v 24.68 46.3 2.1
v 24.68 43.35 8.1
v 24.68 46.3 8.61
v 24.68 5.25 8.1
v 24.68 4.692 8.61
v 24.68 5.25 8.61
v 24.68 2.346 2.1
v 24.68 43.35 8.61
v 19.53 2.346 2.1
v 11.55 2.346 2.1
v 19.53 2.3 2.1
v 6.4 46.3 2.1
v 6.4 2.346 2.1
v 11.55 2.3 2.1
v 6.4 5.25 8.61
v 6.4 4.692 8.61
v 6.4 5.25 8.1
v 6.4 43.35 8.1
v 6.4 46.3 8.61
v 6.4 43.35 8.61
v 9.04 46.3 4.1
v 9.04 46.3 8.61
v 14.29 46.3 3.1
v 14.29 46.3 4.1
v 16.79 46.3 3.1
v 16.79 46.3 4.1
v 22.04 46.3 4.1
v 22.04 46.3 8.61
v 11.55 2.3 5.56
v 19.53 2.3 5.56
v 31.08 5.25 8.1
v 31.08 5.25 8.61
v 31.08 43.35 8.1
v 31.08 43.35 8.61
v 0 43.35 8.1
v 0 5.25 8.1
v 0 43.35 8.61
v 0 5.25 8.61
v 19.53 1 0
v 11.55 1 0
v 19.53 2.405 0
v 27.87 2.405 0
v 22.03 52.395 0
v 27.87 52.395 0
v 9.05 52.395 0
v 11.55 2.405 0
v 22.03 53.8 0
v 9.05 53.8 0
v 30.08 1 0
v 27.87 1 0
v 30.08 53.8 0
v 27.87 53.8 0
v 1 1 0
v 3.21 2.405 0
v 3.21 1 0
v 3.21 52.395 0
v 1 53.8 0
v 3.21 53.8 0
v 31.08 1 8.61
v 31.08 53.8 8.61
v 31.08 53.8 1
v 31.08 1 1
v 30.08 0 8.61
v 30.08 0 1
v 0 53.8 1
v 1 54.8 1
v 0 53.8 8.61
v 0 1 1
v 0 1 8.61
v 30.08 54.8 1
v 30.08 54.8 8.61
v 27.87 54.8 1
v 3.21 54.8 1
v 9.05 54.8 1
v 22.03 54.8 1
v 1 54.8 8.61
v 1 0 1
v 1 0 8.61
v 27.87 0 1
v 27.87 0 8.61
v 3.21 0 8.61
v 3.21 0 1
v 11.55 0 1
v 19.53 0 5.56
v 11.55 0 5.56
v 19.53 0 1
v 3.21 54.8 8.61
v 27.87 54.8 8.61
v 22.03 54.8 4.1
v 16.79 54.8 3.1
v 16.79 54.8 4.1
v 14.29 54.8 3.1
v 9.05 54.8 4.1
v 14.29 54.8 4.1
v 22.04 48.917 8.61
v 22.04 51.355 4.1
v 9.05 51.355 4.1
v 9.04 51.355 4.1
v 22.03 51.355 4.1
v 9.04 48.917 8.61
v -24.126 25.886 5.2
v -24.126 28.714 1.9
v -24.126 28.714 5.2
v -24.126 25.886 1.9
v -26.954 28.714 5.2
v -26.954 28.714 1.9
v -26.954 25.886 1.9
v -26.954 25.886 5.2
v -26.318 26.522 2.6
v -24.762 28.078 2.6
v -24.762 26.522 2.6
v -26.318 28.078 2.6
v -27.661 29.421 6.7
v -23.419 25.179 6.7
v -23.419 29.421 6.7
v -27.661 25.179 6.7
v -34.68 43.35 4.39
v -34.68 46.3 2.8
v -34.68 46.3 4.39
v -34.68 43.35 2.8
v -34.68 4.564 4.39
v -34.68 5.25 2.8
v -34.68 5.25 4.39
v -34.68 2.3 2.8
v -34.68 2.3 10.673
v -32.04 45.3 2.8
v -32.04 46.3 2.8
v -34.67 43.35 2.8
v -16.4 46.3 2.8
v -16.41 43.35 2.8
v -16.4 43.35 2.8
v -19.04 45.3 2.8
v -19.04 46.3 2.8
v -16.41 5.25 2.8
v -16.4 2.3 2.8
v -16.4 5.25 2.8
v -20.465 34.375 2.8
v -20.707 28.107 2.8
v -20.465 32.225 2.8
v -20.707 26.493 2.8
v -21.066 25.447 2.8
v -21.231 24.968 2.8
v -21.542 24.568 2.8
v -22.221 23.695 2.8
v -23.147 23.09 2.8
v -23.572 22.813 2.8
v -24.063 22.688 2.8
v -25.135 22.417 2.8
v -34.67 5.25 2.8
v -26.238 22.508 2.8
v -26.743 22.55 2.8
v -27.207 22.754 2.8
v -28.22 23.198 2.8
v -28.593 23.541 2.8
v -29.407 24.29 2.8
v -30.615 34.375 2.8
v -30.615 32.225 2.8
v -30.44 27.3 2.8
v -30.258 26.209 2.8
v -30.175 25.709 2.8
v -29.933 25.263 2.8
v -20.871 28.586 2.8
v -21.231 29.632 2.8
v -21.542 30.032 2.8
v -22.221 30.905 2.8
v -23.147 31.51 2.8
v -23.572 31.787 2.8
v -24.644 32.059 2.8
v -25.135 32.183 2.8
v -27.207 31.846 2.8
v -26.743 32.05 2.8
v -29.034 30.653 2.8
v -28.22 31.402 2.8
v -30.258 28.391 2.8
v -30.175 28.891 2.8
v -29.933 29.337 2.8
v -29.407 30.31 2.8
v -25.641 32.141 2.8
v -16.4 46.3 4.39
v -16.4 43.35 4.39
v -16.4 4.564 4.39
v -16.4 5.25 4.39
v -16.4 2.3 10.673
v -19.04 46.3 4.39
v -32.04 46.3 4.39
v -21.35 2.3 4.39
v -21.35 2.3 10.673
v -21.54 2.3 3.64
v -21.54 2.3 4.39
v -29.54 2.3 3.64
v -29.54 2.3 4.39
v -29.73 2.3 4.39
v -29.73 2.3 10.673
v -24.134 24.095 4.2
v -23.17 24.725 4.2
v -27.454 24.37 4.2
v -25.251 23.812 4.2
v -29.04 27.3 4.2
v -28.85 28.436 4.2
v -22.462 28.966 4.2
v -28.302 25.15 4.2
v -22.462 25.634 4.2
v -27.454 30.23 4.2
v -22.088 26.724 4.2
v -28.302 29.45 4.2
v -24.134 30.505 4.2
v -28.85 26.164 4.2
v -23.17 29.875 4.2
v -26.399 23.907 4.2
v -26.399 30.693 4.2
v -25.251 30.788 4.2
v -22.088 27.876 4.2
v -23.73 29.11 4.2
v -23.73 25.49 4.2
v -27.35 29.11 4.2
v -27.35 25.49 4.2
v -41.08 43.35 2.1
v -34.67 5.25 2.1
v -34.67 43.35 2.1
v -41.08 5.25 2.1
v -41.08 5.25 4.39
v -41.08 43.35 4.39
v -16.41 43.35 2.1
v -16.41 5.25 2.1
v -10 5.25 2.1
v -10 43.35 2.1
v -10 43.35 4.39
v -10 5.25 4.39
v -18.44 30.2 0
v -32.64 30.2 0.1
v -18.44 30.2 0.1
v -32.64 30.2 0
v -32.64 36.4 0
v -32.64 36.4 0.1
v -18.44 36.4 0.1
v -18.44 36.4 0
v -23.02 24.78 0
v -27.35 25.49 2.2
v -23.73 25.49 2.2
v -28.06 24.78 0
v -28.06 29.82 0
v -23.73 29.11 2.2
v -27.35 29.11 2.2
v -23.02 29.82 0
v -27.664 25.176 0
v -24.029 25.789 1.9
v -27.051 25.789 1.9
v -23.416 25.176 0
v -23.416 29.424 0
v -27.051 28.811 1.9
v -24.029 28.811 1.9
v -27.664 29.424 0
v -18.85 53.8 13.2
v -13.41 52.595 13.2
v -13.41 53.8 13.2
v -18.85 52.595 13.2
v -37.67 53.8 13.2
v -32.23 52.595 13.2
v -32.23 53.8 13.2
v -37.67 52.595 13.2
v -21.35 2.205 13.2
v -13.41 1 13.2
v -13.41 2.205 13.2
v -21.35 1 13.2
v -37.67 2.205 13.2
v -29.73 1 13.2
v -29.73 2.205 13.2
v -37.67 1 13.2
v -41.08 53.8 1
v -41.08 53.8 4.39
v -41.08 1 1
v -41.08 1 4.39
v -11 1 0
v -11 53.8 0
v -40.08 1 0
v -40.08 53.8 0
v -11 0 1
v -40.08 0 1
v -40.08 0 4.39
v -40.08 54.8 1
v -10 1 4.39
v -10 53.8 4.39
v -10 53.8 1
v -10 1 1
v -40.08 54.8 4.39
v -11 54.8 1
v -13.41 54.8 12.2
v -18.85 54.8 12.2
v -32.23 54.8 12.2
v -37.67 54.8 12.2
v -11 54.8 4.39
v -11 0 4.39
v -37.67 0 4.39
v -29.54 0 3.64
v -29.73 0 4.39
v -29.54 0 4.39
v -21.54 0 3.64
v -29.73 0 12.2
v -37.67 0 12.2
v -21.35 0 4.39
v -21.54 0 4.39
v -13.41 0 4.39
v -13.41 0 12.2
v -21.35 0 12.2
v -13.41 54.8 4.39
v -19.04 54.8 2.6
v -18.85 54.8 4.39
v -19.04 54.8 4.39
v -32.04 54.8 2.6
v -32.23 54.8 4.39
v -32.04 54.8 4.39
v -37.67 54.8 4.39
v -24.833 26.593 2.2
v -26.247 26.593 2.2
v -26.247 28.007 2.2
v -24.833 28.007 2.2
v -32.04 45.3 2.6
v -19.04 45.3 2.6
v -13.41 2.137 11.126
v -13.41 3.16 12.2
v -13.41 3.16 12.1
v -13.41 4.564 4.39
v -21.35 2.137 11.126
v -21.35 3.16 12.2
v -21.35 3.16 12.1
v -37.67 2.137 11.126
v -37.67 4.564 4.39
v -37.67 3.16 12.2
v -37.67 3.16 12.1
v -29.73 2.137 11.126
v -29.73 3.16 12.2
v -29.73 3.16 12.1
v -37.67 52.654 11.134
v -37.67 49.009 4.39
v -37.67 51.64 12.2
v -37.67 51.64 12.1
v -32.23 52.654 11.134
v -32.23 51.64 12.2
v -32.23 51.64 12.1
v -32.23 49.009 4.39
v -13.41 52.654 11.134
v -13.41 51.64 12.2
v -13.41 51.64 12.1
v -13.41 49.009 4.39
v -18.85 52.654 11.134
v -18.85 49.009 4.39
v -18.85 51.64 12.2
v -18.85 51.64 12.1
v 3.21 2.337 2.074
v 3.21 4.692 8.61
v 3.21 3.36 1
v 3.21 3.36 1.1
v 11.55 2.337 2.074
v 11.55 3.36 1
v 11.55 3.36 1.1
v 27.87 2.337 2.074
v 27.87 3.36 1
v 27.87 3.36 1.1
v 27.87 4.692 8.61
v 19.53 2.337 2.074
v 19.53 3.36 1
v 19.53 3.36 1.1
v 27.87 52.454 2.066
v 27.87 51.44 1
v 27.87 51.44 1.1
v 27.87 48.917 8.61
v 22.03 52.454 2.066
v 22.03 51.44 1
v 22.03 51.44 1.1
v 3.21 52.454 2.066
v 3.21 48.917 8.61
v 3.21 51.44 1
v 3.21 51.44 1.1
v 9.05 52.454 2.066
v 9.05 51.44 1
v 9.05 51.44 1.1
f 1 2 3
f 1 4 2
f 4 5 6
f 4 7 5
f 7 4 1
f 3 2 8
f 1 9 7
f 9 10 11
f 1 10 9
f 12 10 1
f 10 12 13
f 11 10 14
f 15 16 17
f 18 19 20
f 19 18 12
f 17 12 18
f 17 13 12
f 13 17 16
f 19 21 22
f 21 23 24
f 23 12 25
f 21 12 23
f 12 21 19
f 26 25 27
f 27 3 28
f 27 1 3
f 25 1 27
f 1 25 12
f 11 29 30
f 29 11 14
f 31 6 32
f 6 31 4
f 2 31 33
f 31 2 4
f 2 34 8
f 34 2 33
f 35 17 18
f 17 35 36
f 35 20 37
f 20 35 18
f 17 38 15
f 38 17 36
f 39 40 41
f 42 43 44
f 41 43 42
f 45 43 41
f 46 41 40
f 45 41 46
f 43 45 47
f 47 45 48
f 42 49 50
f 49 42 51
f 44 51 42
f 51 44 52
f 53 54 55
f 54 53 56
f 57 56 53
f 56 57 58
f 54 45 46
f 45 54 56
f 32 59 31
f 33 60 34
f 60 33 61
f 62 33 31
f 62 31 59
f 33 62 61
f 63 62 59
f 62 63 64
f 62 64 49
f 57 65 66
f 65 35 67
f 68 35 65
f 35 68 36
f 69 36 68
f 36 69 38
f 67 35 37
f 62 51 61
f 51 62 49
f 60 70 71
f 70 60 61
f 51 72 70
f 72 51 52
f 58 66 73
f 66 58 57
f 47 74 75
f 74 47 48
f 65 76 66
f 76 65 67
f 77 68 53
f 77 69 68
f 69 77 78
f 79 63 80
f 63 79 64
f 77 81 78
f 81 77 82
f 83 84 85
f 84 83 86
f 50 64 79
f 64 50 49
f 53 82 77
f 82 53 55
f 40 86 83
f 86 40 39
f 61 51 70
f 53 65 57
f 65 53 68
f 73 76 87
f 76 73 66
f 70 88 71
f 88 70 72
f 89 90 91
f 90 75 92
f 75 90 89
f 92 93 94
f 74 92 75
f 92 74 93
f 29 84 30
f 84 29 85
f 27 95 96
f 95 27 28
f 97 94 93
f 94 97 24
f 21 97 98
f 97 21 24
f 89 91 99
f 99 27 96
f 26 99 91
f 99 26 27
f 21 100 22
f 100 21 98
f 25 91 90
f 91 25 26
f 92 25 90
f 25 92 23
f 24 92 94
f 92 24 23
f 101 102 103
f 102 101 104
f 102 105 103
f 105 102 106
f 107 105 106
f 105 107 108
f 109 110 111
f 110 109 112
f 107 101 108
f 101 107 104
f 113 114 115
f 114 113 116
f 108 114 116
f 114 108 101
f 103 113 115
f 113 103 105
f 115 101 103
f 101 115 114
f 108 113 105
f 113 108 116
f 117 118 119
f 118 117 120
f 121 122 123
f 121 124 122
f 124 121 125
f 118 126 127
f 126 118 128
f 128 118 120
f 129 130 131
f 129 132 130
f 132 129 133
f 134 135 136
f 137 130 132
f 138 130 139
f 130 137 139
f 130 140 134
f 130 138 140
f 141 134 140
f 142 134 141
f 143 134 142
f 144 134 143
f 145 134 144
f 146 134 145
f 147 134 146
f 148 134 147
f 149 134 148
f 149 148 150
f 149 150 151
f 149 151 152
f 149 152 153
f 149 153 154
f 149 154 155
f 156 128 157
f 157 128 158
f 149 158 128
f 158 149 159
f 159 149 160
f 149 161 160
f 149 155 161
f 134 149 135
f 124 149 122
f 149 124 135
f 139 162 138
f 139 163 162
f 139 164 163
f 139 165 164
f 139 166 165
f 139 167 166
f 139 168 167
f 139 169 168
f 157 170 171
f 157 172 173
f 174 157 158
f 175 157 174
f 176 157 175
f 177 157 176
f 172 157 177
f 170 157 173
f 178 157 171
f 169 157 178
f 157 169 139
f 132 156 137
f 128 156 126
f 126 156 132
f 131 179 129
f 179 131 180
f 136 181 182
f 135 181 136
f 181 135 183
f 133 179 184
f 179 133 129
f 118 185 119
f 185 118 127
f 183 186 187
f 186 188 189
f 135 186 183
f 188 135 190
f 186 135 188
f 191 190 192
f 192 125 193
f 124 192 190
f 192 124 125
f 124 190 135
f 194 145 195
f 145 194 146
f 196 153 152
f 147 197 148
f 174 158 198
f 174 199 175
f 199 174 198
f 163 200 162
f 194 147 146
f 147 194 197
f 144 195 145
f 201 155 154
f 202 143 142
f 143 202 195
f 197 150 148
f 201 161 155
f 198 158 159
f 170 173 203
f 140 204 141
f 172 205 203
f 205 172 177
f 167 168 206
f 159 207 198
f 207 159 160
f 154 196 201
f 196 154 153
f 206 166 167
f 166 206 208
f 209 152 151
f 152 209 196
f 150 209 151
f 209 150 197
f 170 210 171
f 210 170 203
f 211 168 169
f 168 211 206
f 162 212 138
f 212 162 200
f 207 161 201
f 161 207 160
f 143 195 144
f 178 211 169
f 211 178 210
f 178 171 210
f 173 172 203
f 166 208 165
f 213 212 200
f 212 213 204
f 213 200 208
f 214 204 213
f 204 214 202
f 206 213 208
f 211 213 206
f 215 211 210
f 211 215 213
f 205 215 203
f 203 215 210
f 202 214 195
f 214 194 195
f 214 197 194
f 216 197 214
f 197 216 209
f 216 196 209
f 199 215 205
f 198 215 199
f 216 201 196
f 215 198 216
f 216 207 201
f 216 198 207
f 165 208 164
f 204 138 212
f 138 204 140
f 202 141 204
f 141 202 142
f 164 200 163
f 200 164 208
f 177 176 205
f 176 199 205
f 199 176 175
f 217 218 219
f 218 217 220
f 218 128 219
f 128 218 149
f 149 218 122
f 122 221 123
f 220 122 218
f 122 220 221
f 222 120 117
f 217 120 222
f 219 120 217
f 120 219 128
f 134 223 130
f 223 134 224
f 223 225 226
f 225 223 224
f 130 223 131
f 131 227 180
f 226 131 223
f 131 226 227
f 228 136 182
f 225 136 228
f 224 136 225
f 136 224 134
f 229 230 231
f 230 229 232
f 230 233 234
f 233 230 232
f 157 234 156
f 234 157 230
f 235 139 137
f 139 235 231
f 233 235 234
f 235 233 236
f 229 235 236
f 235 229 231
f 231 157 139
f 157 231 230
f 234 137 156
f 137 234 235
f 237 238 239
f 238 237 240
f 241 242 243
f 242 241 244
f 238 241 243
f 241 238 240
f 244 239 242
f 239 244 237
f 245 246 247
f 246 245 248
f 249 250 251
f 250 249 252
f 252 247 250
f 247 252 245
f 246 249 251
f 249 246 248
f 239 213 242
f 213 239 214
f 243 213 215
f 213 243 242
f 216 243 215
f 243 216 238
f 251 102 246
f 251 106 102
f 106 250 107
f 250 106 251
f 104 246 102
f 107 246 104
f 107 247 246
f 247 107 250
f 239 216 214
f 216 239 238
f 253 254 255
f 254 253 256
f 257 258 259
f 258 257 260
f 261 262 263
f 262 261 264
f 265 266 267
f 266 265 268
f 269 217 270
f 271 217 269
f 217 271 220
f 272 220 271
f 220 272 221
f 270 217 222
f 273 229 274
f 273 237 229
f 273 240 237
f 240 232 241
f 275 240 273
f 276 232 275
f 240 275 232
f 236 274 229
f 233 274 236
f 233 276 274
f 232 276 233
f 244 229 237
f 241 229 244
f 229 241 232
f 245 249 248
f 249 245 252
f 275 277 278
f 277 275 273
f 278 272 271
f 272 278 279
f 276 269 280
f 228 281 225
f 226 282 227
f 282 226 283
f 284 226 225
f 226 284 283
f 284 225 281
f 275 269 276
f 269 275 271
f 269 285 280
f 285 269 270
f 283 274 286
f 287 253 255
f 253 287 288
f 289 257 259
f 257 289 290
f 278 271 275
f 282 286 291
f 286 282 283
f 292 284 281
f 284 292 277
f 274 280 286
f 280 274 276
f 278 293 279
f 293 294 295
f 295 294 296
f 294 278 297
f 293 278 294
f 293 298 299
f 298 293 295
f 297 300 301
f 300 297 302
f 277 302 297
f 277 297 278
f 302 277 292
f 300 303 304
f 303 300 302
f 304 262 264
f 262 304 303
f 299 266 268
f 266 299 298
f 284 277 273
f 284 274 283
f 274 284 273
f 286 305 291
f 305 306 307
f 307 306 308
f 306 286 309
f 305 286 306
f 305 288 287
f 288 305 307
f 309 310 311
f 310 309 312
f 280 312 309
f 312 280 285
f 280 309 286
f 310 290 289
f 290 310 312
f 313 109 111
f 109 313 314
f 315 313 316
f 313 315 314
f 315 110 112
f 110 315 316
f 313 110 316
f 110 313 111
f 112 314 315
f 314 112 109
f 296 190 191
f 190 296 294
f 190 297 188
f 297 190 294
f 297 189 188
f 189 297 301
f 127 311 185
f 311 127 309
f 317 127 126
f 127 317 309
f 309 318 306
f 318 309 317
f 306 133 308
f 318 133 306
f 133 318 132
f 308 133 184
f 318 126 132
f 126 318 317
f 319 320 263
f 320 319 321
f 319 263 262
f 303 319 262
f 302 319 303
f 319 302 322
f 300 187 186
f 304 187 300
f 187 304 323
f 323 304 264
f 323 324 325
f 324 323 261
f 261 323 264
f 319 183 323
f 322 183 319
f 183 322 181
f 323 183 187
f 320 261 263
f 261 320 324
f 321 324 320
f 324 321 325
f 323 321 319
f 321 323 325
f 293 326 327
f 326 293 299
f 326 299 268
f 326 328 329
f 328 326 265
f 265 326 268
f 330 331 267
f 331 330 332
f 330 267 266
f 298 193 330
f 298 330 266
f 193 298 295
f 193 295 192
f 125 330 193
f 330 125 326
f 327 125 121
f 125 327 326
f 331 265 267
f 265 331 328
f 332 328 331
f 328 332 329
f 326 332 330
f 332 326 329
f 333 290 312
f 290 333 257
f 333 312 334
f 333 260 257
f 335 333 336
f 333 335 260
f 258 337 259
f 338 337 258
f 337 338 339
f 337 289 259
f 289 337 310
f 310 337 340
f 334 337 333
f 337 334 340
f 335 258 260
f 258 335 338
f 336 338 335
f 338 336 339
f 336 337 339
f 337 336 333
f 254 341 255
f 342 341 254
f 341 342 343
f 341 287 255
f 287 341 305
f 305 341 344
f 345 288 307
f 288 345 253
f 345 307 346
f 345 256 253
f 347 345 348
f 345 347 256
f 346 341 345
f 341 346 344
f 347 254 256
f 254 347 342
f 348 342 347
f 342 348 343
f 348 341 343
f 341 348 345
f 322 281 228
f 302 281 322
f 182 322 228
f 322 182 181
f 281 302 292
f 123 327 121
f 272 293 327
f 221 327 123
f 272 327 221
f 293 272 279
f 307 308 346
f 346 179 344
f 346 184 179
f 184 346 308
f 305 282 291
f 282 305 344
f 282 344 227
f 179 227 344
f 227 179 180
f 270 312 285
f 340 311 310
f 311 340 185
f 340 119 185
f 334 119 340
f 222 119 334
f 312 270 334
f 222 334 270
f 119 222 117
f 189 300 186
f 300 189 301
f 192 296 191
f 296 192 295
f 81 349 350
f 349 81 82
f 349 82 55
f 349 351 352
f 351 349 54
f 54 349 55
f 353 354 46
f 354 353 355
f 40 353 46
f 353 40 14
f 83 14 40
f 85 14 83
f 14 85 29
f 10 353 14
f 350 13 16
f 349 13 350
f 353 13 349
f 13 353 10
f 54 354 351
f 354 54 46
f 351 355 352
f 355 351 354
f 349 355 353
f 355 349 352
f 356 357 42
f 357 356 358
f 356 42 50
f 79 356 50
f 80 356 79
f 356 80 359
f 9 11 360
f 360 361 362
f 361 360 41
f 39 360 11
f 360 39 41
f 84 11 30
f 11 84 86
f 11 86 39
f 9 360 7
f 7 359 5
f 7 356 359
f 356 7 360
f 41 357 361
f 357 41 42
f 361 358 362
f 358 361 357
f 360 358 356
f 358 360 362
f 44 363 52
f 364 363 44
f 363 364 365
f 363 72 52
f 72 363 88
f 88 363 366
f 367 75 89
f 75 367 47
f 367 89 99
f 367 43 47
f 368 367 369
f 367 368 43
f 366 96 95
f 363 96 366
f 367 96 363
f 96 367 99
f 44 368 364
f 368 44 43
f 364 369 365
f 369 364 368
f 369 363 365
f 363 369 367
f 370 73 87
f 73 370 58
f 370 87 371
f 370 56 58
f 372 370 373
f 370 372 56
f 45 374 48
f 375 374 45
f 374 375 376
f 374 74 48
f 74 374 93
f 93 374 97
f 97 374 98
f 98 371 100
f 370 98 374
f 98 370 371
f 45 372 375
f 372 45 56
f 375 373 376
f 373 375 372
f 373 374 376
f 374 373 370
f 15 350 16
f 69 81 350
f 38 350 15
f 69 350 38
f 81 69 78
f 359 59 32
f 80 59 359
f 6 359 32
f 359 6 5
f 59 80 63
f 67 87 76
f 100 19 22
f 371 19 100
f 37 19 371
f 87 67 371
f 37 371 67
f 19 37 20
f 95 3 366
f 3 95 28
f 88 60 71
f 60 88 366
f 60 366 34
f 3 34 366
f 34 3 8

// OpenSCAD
//////////////////////////////////////////////////////////////////////////////////////
///
///  Pin Protector Shell for Arduino Nano and compatibles
///
///  This project generated a shell around an Arduino Nano or Nano compatible
///  which protects all pins from being exposed to accidental shorting with tools
///  or other metallic objects on the work bench.
///
///  Right angle pin headers mounted on the upper side of the Nano PCB are used 
///  instead of the straight headers normally used. Two 15-pin single row and one
///  3x2-pin double row pin header arrays are needed.  This way, all connections
///  to he Nano are horizontal and are safely "hidden" between the upper and lower part
///  of the shell. 
///
///  The so covered horizontal pin connector increade the surface of the Nano shell,
///  so that there is enough space on the top shell for a sticker which identifies
///  each pin in a nicely readable size.
///
///  The top of the shell has a coutout for the 4 LEDs and has an integrated RESET
///  button which is printed in-situ and held in position by its waisted shape.
///
///  Given that there are several variants of the Nano design which essentially differ
///  slightly in the placement of the LEDs and the RESET button, so their longitudinal
///  position (measured in mm from the USB end of the PCB) is parametrized and can
///  easily adapted when needed. 
///
///  In addition to this SCAD file, there is also a corresponding PostScript file
///  which generates the labels to stick on the top part of the shell.
///  
//////////////////////////////////////////////////////////////////////////////////////
///
///  2015-06-13 Heinz Spiess, Switzerland
///
///  released under Creative Commons - Attribution - Share Alike licence (CC BY-SA)
//////////////////////////////////////////////////////////////////////////////////////

ew = 0.56;
eh = 0.252;

module chamfered_cube(size,d=1){
   hull(){
     translate([d,d,0])cube(size-2*[d,d,0]);
     translate([0,d,d])cube(size-2*[0,d,d]);
     translate([d,0,d])cube(size-2*[d,0,d]);
   }
}


// build a cylinder with chamfered edges
module chamfered_cylinder(r=0,r1=0,r2=0,h=0,d=1){
   hull(){
      translate([0,0,d])cylinder(r1=(r?r:r1),r2=(r>0?r:r2),h=h-2*d);
      cylinder(r1=(r?r:r1)-d,r2=(r>0?r:r2)-d,h=h);
   }
}


module nanoshell(
   W = .7*25.4+0.5,
   L = 44,
   H1 = 6,
   H2 = 3,
   pins = 15,
   wall = [6.4,2.3,2.1],
   all = false,
   ledx = 10, 
   ledy = 30,
   resety = 25,
   resetz = 4.5,
   resetr = 2,
   upper = false,
   lower = false,
   case = false,
   move = true,
   eps = -0.2,
){
   usb = [8,9,4];
   isp = [13,8.5,6.5];
   ispk = [2.5,8,7.5];
   Wo = 2*wall[0]+W;
   Ho = 2*wall[2]+H1+H2;
   Lo = wall[1]+L+isp[1];

module case(){
   // reset knob
   translate([Wo/2,wall[1]+resety,Ho-wall[2]-resetz-0.1])rotate(45){
           cylinder(r=resetr,h=2+wall[2],$fn=4);
           cylinder(r2=resetr,r1=resetr+1,h=resetz-1-2,$fn=4);
   }
   difference(){
     // main body
     chamfered_cube([2*wall[0]+W,wall[1]+L+isp[1],2*wall[2]+H1+H2]);
     translate([Wo/2,wall[1]+resety,Ho-wall[2]-2-0.1])rotate(45){
           cylinder(r1=1.5,h=2,$fn=4);
     }
     // main cutout
     difference(){
         translate(wall) cube([W,L,Ho-2*wall[2]-0.7]);
         translate([Wo/2,wall[1]+resety,Ho-wall[2]-2-0.1])
	    cylinder(r1=3.5,r2=6,h=2.5);
     }
     // pin cutout
     translate([Wo/2,0,0])for(sx=[-1,1])scale([sx,1,1])
        translate([-Wo/2-1, wall[1]+L/2-pins/2*2.54,wall[2]+H1])
           cube([wall[0]+1.01,pins*2.54,H2]);
     // mini USB cutout
     translate([wall[0]+W/2-usb[0]/2,-1,wall[2]+H1-2.54])
        cube(usb);
     // 3x2pin ISP header main cutout
     translate([wall[0]+W/2-isp[0]/2,wall[1]+L-1,wall[2]+H1-4])
        cube(isp+[0,2,0]);
     // 3x2pin ISP header key cutout
     translate([wall[0]+W/2-ispk[0]/2,wall[1]+L-1,wall[2]+H1-3-2])
        cube(ispk+[0,2,0]);
     // LED cutout
     translate([Wo/2-ledx/2,wall[1]+ledy,Ho-wall[2]-0.1-0.7]){
        translate([0,0,-H1/2])cube([ledx,2,wall[2]+H1/2]);
        hull(){
           cube([ledx,2,.1]);
           translate([-wall[2],-wall[2],wall[2]+0.7])cube([ledx+2*wall[2],2+2*wall[2],.2]);
        }
     }
     // Reset knob
     translate([Wo/2,wall[1]+resety,Ho-wall[2]-0.1])rotate(45){
        difference(){
           cylinder(r1=resetr+ew,r2=resetr+wall[2]/2+ew,h=wall[2]+0.2,$fn=4);
           cylinder(r1=resetr,r2=resetr+wall[2]/2,h=wall[2]+0.2,$fn=4);
	}
     }
     translate([Wo/2,wall[1]+resety,Ho-wall[2]-2-0.1])rotate(45){
        difference(){
           cylinder(r=resetr+ew,h=wall[2]+0.2,$fn=4);
           cylinder(r=resetr,h=wall[2]+0.2,$fn=4);
	}
     }
   }
}

module cuthalf(gap=0){
   difference(){
      // main lower half
      translate([-1,-1,-1]) cube([Wo+2,Lo+2,wall[2]+H1+1.51-gap]);
      // reset knob
      translate([Wo/2,wall[1]+resety,wall[2]+0.1])
         cylinder(r=5,h=Ho-wall[2]-0.11);
      // clips on USB side
      translate([Wo/2,0,0])for(sx=[-1,1])scale([sx,1,1]){
         translate([usb[0]/2-0.01-gap,-1,-0.1]){
	    cube([Wo/2-usb[0]/2-wall[0]/2+2*gap,wall[1]+1.01+gap,Ho+2]);
            hull(){
	       translate([0,0,wall[2]])
                  cube([Wo/2-usb[0]/2-wall[0]/2+2*gap,wall[1]+1.01+gap,Ho-wall[2]]);
               translate([0,0,Ho])
	          cube([Wo/2-usb[0]/2-wall[0]/2+2*gap,wall[1]+5.01+gap,1]);
            }
	    hull(){
	       cube([Wo/2-usb[0]/2-wall[0]/2+2*gap,wall[1]+1.01+gap,wall[2]+0.1]);
	       translate([0,0,0.1+wall[2]/2-0.05])
	       cube([Wo/2-usb[0]/2-wall[0]/2+2*gap,wall[1]+1.01+wall[2]/2+gap,0.1]);
	    }
         }
      }
      // clips on ISP side
      translate([Wo/2,Lo,0])rotate(180)for(sx=[-1,1])scale([sx,1,1]){
         translate([isp[0]/2-0.01-gap,-1,-0.1]){
	    cube([Wo/2-isp[0]/2-wall[0]/2+2*gap,wall[1]+1.01+gap,Ho+2]);
            hull(){
	       translate([0,0,wall[2]])
                  cube([Wo/2-isp[0]/2-wall[0]/2+2*gap,wall[1]+1.01+gap,Ho-wall[2]]);
               translate([0,0,Ho])
	          cube([Wo/2-isp[0]/2-wall[0]/2+2*gap,wall[1]+7.01+gap,1]);
            }
	    hull(){
	       cube([Wo/2-isp[0]/2-wall[0]/2+2*gap,wall[1]+1.01+gap,wall[2]+0.1]);
	       translate([0,0,0.1+wall[2]/2-0.05])
	       cube([Wo/2-isp[0]/2-wall[0]/2+2*gap,wall[1]+1.01+wall[2]/2+gap,0.1]);
	    }
         }
      }
   }

}

module lower(eps=0){
   intersection(){
      case();
      cuthalf(gap=eps);
   }
}

module upper(eps=0){
   translate([0,0,move?Ho:0])rotate([0,move?180:0,0])difference(){
      case();
      cuthalf(gap=eps);
   }
}
     if(case){
        lower(eps=0);
        upper(eps=eps);
     }
     if(lower) lower(eps=0);
     if(upper) upper(eps=eps);
}

module NanoShellR25L30(){ // AUTO_MAKE_STL
   translate([-3,0,0])nanoshell(upper=true,eps=-0.2,resety=25,ledy=30);
   nanoshell(lower=true,resety=25,ledy=30);
}

module NanoShellR24L29(){ // AUTO_MAKE_STL
   translate([-3,0,0])nanoshell(upper=true,eps=-0.2,resety=24,ledy=29);
   nanoshell(lower=true,resety=24,ledy=29);
}

module NanoShellR26L32(){ // AUTO_MAKE_STL
   translate([-3,0,0])nanoshell(upper=true,eps=-0.2,resety=26,ledy=32);
   nanoshell(lower=true,resety=26,ledy=32);
}

translate([-10,0,0])nanoshell(upper=true,eps=-0.2);
//nanoshell(upper=true,move=false,eps=-0.2);
nanoshell(lower=true);
